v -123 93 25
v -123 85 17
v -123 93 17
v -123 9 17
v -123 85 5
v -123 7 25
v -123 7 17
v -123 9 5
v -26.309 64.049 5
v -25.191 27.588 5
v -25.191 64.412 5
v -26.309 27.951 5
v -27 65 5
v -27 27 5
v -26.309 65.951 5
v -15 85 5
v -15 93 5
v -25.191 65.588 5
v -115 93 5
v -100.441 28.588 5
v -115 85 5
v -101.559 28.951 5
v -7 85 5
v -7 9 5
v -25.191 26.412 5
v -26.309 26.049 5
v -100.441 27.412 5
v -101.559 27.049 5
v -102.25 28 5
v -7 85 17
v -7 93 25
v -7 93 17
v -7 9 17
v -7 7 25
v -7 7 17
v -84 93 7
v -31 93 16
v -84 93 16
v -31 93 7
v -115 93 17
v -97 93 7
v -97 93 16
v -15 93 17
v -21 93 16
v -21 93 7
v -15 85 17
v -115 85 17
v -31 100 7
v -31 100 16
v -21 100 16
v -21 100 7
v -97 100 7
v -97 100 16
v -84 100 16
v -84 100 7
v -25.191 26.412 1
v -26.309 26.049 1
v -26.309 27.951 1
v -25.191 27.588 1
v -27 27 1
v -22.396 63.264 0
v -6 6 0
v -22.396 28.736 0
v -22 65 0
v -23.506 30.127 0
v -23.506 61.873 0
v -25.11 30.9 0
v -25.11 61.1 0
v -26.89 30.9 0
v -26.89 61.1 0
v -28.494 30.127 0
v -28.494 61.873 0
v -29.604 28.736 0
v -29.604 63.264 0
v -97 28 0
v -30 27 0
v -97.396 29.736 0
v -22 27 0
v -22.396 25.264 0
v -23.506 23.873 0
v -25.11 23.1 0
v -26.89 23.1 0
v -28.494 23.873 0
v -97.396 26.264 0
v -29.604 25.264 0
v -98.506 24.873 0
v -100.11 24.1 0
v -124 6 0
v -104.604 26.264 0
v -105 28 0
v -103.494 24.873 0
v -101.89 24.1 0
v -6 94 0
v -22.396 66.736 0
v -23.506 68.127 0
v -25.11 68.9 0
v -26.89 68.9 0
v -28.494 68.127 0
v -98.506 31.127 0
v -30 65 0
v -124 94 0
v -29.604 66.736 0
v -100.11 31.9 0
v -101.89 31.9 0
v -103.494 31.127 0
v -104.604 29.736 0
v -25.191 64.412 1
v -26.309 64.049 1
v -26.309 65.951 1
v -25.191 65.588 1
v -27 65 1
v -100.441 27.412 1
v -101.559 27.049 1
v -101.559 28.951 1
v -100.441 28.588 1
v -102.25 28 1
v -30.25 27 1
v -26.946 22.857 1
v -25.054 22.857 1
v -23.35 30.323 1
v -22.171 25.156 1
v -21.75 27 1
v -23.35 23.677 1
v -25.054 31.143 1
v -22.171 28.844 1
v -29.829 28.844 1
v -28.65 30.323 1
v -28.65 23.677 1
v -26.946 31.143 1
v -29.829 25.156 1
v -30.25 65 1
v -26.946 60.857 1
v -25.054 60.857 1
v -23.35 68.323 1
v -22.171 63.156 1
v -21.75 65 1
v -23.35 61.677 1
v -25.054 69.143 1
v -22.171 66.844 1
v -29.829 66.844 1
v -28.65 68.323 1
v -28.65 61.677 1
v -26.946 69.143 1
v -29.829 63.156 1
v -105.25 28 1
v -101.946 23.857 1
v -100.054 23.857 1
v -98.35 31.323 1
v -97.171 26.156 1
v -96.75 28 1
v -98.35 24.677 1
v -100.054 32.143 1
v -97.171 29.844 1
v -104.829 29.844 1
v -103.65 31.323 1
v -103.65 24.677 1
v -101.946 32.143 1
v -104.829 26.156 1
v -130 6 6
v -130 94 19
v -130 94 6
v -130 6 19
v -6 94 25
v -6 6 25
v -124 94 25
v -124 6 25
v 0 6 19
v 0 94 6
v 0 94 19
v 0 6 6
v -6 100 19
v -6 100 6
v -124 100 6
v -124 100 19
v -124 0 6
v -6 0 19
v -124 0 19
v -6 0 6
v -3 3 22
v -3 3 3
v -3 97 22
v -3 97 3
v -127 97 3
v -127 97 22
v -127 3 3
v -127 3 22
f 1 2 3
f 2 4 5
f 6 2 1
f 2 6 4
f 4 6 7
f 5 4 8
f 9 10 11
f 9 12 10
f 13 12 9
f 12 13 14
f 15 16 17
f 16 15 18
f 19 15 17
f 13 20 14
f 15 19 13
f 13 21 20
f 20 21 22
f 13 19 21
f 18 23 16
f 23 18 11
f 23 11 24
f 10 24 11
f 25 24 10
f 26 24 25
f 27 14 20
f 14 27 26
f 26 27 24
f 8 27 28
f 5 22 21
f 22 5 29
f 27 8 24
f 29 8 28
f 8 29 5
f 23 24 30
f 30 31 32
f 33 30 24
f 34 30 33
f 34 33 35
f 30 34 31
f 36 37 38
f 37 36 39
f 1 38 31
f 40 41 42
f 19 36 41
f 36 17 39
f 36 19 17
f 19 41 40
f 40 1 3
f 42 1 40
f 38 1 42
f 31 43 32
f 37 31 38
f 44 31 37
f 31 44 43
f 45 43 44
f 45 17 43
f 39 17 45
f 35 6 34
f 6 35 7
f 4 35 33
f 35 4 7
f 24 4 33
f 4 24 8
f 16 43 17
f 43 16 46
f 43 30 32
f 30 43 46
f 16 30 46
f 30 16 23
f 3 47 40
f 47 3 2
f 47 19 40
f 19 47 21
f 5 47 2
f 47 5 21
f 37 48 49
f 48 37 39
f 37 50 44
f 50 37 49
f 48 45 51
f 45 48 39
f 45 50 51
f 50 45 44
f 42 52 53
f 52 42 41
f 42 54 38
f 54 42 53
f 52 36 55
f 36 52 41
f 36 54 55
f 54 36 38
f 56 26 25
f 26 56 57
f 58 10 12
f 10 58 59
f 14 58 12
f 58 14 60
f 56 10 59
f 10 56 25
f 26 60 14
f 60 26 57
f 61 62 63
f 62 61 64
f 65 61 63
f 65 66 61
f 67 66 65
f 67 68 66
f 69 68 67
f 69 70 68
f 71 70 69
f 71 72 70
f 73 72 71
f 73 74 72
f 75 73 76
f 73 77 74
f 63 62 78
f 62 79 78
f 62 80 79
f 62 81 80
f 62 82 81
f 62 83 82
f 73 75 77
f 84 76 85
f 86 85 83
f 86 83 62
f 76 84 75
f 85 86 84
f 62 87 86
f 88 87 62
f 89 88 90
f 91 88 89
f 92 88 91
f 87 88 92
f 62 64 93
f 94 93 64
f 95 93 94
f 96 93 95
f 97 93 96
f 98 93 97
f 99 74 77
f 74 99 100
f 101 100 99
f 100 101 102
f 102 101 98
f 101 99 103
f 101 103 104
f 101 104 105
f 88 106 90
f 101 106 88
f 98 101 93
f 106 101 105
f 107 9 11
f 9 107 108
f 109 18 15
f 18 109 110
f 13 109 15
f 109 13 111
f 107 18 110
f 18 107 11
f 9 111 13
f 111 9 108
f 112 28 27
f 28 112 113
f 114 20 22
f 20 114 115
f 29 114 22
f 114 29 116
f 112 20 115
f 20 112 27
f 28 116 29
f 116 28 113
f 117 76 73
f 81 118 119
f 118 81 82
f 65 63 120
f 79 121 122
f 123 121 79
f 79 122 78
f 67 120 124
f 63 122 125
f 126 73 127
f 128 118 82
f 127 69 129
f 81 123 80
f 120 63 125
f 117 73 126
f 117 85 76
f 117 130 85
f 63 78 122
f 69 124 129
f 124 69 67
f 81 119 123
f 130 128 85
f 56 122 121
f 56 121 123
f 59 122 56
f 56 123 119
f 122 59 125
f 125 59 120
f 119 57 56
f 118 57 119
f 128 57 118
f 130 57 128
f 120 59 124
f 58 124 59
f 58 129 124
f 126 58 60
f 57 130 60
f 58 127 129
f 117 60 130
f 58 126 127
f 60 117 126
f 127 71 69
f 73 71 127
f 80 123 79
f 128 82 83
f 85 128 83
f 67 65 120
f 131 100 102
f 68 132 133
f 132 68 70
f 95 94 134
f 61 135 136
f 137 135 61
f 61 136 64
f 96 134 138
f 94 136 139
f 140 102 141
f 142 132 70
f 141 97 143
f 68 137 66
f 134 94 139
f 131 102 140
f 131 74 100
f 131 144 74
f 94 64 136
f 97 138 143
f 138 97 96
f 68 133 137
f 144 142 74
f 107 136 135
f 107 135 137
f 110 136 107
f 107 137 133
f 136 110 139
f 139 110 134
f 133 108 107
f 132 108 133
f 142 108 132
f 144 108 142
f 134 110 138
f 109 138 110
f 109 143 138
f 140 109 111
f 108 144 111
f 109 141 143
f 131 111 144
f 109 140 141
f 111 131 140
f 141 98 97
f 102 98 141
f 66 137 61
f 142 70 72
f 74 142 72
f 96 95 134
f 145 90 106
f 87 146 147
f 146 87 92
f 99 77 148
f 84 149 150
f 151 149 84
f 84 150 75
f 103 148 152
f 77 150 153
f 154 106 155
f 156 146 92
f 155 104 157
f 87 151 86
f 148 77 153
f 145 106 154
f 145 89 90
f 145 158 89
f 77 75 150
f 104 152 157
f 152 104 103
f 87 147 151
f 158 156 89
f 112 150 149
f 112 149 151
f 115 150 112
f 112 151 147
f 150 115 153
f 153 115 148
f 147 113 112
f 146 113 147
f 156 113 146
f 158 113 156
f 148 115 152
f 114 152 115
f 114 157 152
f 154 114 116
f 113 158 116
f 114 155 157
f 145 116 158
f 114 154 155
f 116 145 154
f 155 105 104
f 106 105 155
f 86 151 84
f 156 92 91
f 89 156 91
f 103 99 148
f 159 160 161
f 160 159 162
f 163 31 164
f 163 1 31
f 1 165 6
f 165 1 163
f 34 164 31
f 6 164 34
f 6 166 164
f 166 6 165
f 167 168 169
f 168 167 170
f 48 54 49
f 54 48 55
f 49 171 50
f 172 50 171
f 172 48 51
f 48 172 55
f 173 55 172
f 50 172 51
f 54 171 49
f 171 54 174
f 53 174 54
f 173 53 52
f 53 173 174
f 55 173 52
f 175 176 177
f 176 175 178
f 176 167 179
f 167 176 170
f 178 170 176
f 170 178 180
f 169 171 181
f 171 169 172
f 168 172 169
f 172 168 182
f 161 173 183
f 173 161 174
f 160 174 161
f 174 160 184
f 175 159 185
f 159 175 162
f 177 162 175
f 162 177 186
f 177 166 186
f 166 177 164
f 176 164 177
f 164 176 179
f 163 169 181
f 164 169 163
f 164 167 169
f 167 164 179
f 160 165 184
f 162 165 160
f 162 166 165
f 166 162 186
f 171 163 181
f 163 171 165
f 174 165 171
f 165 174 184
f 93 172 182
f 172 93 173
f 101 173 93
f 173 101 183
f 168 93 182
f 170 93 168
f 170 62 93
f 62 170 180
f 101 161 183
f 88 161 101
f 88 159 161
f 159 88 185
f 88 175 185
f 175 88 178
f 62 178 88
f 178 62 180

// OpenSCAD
 triangle_width = 8;
 
 inside=[116,86,21];
 wall_width = 7;
 
module ttrs() {
    translate([14,70,2]){
        cube([10,40,9]);
    }
    translate([77,70,2]){
        cube([13,40,9]);
    }
    translate([19,20,-5]){
        cylinder(8,1,1);
    }
    translate([19,58,-5]){
        cylinder(8,1,1);
    }
    translate([94.25,21,-5]){
        cylinder(8,1,1);
    }
    
    translate([19,20,-5]){
        cylinder(1,4,4.25);
    }
    translate([19,58,-5]){
        cylinder(1,4,4.25);
    }
    translate([94,21,-5]){
        cylinder(1,4,4.25);
    }
    
}

module board() {
    difference() {
        cube(inside,false);
        cutout = [116,2,12];
        color("DarkTurquoise", 1.0) cube(cutout, false);
        
        corner = [8,8,12];
        translate([0,78,0]) color("DarkTurquoise", 1.0) cube(corner, false);
        translate([108,78,0]) color("DarkTurquoise", 1.0) cube(corner, false);
    }
}

module vit() {
   
     translate([wall_width,wall_width,5]){
         board();
         ttrs();
     }
}
module case() {
 sidewall=[wall_width*2,wall_width*2,4];
 outside=inside+sidewall;
 difference(){
     cube(outside, false);
     vit();
 }
 }
 module corner(rotation) {
     points_corner = [
        [0,0,0],
        [triangle_width,0,0],
        [0,triangle_width,0],
        [0,0,30],
        [triangle_width,0,30],
        [0,triangle_width,30]
     ];
     
         faces_corner = [
     [0,1,2],
     [0,4,1], [0,3,4],
     [1,4,5], [1,5,2],
     [2,5,3],[2,3,0],
     [3,5,4]
     ];
        rotate(rotation){
         translate([-1,-1,-1]){
    polyhedron(points_corner, faces_corner);
         }
     }
 }
 
 module top_edge(rotation) {
     points_corner = [
        [0,0,0],
        [triangle_width,0,0],
        [0,triangle_width,0],
        [0,0,200],
        [triangle_width,0,200],
        [0,triangle_width,200]
     ];
     
     faces_corner = [
     [0,1,2],
     [0,4,1], [0,3,4],
     [1,4,5], [1,5,2],
     [2,5,3],[2,3,0],
     [3,5,4]
     ];
        rotate([rotation, 90,0]){
         translate([-26,-1,-1]){
    polyhedron(points_corner, faces_corner);
         }
     }
 }
 
 module corners() {
     corner(0);
     translate([0,100,0]){
         corner(-90);
     }
     translate([130,100,0]){
         corner(180);
     }
     
     translate([130,0,0]){
         corner(90);
     }
 }
 
 module top() {
     top_edge(0);
     translate([0,100,0]){
             top_edge(90);
         }
     translate([130,0,0]){
             top_edge(-90);
         }
     translate([130,100,0]){
             top_edge(180);
         }
     }
mirror(){
 difference(){
     case();
     corners();
     top();
     translate([0,100,25]) {
     rotate([180,0,0]) {
         top();
     } 
 }
 }
    }
 //board();
